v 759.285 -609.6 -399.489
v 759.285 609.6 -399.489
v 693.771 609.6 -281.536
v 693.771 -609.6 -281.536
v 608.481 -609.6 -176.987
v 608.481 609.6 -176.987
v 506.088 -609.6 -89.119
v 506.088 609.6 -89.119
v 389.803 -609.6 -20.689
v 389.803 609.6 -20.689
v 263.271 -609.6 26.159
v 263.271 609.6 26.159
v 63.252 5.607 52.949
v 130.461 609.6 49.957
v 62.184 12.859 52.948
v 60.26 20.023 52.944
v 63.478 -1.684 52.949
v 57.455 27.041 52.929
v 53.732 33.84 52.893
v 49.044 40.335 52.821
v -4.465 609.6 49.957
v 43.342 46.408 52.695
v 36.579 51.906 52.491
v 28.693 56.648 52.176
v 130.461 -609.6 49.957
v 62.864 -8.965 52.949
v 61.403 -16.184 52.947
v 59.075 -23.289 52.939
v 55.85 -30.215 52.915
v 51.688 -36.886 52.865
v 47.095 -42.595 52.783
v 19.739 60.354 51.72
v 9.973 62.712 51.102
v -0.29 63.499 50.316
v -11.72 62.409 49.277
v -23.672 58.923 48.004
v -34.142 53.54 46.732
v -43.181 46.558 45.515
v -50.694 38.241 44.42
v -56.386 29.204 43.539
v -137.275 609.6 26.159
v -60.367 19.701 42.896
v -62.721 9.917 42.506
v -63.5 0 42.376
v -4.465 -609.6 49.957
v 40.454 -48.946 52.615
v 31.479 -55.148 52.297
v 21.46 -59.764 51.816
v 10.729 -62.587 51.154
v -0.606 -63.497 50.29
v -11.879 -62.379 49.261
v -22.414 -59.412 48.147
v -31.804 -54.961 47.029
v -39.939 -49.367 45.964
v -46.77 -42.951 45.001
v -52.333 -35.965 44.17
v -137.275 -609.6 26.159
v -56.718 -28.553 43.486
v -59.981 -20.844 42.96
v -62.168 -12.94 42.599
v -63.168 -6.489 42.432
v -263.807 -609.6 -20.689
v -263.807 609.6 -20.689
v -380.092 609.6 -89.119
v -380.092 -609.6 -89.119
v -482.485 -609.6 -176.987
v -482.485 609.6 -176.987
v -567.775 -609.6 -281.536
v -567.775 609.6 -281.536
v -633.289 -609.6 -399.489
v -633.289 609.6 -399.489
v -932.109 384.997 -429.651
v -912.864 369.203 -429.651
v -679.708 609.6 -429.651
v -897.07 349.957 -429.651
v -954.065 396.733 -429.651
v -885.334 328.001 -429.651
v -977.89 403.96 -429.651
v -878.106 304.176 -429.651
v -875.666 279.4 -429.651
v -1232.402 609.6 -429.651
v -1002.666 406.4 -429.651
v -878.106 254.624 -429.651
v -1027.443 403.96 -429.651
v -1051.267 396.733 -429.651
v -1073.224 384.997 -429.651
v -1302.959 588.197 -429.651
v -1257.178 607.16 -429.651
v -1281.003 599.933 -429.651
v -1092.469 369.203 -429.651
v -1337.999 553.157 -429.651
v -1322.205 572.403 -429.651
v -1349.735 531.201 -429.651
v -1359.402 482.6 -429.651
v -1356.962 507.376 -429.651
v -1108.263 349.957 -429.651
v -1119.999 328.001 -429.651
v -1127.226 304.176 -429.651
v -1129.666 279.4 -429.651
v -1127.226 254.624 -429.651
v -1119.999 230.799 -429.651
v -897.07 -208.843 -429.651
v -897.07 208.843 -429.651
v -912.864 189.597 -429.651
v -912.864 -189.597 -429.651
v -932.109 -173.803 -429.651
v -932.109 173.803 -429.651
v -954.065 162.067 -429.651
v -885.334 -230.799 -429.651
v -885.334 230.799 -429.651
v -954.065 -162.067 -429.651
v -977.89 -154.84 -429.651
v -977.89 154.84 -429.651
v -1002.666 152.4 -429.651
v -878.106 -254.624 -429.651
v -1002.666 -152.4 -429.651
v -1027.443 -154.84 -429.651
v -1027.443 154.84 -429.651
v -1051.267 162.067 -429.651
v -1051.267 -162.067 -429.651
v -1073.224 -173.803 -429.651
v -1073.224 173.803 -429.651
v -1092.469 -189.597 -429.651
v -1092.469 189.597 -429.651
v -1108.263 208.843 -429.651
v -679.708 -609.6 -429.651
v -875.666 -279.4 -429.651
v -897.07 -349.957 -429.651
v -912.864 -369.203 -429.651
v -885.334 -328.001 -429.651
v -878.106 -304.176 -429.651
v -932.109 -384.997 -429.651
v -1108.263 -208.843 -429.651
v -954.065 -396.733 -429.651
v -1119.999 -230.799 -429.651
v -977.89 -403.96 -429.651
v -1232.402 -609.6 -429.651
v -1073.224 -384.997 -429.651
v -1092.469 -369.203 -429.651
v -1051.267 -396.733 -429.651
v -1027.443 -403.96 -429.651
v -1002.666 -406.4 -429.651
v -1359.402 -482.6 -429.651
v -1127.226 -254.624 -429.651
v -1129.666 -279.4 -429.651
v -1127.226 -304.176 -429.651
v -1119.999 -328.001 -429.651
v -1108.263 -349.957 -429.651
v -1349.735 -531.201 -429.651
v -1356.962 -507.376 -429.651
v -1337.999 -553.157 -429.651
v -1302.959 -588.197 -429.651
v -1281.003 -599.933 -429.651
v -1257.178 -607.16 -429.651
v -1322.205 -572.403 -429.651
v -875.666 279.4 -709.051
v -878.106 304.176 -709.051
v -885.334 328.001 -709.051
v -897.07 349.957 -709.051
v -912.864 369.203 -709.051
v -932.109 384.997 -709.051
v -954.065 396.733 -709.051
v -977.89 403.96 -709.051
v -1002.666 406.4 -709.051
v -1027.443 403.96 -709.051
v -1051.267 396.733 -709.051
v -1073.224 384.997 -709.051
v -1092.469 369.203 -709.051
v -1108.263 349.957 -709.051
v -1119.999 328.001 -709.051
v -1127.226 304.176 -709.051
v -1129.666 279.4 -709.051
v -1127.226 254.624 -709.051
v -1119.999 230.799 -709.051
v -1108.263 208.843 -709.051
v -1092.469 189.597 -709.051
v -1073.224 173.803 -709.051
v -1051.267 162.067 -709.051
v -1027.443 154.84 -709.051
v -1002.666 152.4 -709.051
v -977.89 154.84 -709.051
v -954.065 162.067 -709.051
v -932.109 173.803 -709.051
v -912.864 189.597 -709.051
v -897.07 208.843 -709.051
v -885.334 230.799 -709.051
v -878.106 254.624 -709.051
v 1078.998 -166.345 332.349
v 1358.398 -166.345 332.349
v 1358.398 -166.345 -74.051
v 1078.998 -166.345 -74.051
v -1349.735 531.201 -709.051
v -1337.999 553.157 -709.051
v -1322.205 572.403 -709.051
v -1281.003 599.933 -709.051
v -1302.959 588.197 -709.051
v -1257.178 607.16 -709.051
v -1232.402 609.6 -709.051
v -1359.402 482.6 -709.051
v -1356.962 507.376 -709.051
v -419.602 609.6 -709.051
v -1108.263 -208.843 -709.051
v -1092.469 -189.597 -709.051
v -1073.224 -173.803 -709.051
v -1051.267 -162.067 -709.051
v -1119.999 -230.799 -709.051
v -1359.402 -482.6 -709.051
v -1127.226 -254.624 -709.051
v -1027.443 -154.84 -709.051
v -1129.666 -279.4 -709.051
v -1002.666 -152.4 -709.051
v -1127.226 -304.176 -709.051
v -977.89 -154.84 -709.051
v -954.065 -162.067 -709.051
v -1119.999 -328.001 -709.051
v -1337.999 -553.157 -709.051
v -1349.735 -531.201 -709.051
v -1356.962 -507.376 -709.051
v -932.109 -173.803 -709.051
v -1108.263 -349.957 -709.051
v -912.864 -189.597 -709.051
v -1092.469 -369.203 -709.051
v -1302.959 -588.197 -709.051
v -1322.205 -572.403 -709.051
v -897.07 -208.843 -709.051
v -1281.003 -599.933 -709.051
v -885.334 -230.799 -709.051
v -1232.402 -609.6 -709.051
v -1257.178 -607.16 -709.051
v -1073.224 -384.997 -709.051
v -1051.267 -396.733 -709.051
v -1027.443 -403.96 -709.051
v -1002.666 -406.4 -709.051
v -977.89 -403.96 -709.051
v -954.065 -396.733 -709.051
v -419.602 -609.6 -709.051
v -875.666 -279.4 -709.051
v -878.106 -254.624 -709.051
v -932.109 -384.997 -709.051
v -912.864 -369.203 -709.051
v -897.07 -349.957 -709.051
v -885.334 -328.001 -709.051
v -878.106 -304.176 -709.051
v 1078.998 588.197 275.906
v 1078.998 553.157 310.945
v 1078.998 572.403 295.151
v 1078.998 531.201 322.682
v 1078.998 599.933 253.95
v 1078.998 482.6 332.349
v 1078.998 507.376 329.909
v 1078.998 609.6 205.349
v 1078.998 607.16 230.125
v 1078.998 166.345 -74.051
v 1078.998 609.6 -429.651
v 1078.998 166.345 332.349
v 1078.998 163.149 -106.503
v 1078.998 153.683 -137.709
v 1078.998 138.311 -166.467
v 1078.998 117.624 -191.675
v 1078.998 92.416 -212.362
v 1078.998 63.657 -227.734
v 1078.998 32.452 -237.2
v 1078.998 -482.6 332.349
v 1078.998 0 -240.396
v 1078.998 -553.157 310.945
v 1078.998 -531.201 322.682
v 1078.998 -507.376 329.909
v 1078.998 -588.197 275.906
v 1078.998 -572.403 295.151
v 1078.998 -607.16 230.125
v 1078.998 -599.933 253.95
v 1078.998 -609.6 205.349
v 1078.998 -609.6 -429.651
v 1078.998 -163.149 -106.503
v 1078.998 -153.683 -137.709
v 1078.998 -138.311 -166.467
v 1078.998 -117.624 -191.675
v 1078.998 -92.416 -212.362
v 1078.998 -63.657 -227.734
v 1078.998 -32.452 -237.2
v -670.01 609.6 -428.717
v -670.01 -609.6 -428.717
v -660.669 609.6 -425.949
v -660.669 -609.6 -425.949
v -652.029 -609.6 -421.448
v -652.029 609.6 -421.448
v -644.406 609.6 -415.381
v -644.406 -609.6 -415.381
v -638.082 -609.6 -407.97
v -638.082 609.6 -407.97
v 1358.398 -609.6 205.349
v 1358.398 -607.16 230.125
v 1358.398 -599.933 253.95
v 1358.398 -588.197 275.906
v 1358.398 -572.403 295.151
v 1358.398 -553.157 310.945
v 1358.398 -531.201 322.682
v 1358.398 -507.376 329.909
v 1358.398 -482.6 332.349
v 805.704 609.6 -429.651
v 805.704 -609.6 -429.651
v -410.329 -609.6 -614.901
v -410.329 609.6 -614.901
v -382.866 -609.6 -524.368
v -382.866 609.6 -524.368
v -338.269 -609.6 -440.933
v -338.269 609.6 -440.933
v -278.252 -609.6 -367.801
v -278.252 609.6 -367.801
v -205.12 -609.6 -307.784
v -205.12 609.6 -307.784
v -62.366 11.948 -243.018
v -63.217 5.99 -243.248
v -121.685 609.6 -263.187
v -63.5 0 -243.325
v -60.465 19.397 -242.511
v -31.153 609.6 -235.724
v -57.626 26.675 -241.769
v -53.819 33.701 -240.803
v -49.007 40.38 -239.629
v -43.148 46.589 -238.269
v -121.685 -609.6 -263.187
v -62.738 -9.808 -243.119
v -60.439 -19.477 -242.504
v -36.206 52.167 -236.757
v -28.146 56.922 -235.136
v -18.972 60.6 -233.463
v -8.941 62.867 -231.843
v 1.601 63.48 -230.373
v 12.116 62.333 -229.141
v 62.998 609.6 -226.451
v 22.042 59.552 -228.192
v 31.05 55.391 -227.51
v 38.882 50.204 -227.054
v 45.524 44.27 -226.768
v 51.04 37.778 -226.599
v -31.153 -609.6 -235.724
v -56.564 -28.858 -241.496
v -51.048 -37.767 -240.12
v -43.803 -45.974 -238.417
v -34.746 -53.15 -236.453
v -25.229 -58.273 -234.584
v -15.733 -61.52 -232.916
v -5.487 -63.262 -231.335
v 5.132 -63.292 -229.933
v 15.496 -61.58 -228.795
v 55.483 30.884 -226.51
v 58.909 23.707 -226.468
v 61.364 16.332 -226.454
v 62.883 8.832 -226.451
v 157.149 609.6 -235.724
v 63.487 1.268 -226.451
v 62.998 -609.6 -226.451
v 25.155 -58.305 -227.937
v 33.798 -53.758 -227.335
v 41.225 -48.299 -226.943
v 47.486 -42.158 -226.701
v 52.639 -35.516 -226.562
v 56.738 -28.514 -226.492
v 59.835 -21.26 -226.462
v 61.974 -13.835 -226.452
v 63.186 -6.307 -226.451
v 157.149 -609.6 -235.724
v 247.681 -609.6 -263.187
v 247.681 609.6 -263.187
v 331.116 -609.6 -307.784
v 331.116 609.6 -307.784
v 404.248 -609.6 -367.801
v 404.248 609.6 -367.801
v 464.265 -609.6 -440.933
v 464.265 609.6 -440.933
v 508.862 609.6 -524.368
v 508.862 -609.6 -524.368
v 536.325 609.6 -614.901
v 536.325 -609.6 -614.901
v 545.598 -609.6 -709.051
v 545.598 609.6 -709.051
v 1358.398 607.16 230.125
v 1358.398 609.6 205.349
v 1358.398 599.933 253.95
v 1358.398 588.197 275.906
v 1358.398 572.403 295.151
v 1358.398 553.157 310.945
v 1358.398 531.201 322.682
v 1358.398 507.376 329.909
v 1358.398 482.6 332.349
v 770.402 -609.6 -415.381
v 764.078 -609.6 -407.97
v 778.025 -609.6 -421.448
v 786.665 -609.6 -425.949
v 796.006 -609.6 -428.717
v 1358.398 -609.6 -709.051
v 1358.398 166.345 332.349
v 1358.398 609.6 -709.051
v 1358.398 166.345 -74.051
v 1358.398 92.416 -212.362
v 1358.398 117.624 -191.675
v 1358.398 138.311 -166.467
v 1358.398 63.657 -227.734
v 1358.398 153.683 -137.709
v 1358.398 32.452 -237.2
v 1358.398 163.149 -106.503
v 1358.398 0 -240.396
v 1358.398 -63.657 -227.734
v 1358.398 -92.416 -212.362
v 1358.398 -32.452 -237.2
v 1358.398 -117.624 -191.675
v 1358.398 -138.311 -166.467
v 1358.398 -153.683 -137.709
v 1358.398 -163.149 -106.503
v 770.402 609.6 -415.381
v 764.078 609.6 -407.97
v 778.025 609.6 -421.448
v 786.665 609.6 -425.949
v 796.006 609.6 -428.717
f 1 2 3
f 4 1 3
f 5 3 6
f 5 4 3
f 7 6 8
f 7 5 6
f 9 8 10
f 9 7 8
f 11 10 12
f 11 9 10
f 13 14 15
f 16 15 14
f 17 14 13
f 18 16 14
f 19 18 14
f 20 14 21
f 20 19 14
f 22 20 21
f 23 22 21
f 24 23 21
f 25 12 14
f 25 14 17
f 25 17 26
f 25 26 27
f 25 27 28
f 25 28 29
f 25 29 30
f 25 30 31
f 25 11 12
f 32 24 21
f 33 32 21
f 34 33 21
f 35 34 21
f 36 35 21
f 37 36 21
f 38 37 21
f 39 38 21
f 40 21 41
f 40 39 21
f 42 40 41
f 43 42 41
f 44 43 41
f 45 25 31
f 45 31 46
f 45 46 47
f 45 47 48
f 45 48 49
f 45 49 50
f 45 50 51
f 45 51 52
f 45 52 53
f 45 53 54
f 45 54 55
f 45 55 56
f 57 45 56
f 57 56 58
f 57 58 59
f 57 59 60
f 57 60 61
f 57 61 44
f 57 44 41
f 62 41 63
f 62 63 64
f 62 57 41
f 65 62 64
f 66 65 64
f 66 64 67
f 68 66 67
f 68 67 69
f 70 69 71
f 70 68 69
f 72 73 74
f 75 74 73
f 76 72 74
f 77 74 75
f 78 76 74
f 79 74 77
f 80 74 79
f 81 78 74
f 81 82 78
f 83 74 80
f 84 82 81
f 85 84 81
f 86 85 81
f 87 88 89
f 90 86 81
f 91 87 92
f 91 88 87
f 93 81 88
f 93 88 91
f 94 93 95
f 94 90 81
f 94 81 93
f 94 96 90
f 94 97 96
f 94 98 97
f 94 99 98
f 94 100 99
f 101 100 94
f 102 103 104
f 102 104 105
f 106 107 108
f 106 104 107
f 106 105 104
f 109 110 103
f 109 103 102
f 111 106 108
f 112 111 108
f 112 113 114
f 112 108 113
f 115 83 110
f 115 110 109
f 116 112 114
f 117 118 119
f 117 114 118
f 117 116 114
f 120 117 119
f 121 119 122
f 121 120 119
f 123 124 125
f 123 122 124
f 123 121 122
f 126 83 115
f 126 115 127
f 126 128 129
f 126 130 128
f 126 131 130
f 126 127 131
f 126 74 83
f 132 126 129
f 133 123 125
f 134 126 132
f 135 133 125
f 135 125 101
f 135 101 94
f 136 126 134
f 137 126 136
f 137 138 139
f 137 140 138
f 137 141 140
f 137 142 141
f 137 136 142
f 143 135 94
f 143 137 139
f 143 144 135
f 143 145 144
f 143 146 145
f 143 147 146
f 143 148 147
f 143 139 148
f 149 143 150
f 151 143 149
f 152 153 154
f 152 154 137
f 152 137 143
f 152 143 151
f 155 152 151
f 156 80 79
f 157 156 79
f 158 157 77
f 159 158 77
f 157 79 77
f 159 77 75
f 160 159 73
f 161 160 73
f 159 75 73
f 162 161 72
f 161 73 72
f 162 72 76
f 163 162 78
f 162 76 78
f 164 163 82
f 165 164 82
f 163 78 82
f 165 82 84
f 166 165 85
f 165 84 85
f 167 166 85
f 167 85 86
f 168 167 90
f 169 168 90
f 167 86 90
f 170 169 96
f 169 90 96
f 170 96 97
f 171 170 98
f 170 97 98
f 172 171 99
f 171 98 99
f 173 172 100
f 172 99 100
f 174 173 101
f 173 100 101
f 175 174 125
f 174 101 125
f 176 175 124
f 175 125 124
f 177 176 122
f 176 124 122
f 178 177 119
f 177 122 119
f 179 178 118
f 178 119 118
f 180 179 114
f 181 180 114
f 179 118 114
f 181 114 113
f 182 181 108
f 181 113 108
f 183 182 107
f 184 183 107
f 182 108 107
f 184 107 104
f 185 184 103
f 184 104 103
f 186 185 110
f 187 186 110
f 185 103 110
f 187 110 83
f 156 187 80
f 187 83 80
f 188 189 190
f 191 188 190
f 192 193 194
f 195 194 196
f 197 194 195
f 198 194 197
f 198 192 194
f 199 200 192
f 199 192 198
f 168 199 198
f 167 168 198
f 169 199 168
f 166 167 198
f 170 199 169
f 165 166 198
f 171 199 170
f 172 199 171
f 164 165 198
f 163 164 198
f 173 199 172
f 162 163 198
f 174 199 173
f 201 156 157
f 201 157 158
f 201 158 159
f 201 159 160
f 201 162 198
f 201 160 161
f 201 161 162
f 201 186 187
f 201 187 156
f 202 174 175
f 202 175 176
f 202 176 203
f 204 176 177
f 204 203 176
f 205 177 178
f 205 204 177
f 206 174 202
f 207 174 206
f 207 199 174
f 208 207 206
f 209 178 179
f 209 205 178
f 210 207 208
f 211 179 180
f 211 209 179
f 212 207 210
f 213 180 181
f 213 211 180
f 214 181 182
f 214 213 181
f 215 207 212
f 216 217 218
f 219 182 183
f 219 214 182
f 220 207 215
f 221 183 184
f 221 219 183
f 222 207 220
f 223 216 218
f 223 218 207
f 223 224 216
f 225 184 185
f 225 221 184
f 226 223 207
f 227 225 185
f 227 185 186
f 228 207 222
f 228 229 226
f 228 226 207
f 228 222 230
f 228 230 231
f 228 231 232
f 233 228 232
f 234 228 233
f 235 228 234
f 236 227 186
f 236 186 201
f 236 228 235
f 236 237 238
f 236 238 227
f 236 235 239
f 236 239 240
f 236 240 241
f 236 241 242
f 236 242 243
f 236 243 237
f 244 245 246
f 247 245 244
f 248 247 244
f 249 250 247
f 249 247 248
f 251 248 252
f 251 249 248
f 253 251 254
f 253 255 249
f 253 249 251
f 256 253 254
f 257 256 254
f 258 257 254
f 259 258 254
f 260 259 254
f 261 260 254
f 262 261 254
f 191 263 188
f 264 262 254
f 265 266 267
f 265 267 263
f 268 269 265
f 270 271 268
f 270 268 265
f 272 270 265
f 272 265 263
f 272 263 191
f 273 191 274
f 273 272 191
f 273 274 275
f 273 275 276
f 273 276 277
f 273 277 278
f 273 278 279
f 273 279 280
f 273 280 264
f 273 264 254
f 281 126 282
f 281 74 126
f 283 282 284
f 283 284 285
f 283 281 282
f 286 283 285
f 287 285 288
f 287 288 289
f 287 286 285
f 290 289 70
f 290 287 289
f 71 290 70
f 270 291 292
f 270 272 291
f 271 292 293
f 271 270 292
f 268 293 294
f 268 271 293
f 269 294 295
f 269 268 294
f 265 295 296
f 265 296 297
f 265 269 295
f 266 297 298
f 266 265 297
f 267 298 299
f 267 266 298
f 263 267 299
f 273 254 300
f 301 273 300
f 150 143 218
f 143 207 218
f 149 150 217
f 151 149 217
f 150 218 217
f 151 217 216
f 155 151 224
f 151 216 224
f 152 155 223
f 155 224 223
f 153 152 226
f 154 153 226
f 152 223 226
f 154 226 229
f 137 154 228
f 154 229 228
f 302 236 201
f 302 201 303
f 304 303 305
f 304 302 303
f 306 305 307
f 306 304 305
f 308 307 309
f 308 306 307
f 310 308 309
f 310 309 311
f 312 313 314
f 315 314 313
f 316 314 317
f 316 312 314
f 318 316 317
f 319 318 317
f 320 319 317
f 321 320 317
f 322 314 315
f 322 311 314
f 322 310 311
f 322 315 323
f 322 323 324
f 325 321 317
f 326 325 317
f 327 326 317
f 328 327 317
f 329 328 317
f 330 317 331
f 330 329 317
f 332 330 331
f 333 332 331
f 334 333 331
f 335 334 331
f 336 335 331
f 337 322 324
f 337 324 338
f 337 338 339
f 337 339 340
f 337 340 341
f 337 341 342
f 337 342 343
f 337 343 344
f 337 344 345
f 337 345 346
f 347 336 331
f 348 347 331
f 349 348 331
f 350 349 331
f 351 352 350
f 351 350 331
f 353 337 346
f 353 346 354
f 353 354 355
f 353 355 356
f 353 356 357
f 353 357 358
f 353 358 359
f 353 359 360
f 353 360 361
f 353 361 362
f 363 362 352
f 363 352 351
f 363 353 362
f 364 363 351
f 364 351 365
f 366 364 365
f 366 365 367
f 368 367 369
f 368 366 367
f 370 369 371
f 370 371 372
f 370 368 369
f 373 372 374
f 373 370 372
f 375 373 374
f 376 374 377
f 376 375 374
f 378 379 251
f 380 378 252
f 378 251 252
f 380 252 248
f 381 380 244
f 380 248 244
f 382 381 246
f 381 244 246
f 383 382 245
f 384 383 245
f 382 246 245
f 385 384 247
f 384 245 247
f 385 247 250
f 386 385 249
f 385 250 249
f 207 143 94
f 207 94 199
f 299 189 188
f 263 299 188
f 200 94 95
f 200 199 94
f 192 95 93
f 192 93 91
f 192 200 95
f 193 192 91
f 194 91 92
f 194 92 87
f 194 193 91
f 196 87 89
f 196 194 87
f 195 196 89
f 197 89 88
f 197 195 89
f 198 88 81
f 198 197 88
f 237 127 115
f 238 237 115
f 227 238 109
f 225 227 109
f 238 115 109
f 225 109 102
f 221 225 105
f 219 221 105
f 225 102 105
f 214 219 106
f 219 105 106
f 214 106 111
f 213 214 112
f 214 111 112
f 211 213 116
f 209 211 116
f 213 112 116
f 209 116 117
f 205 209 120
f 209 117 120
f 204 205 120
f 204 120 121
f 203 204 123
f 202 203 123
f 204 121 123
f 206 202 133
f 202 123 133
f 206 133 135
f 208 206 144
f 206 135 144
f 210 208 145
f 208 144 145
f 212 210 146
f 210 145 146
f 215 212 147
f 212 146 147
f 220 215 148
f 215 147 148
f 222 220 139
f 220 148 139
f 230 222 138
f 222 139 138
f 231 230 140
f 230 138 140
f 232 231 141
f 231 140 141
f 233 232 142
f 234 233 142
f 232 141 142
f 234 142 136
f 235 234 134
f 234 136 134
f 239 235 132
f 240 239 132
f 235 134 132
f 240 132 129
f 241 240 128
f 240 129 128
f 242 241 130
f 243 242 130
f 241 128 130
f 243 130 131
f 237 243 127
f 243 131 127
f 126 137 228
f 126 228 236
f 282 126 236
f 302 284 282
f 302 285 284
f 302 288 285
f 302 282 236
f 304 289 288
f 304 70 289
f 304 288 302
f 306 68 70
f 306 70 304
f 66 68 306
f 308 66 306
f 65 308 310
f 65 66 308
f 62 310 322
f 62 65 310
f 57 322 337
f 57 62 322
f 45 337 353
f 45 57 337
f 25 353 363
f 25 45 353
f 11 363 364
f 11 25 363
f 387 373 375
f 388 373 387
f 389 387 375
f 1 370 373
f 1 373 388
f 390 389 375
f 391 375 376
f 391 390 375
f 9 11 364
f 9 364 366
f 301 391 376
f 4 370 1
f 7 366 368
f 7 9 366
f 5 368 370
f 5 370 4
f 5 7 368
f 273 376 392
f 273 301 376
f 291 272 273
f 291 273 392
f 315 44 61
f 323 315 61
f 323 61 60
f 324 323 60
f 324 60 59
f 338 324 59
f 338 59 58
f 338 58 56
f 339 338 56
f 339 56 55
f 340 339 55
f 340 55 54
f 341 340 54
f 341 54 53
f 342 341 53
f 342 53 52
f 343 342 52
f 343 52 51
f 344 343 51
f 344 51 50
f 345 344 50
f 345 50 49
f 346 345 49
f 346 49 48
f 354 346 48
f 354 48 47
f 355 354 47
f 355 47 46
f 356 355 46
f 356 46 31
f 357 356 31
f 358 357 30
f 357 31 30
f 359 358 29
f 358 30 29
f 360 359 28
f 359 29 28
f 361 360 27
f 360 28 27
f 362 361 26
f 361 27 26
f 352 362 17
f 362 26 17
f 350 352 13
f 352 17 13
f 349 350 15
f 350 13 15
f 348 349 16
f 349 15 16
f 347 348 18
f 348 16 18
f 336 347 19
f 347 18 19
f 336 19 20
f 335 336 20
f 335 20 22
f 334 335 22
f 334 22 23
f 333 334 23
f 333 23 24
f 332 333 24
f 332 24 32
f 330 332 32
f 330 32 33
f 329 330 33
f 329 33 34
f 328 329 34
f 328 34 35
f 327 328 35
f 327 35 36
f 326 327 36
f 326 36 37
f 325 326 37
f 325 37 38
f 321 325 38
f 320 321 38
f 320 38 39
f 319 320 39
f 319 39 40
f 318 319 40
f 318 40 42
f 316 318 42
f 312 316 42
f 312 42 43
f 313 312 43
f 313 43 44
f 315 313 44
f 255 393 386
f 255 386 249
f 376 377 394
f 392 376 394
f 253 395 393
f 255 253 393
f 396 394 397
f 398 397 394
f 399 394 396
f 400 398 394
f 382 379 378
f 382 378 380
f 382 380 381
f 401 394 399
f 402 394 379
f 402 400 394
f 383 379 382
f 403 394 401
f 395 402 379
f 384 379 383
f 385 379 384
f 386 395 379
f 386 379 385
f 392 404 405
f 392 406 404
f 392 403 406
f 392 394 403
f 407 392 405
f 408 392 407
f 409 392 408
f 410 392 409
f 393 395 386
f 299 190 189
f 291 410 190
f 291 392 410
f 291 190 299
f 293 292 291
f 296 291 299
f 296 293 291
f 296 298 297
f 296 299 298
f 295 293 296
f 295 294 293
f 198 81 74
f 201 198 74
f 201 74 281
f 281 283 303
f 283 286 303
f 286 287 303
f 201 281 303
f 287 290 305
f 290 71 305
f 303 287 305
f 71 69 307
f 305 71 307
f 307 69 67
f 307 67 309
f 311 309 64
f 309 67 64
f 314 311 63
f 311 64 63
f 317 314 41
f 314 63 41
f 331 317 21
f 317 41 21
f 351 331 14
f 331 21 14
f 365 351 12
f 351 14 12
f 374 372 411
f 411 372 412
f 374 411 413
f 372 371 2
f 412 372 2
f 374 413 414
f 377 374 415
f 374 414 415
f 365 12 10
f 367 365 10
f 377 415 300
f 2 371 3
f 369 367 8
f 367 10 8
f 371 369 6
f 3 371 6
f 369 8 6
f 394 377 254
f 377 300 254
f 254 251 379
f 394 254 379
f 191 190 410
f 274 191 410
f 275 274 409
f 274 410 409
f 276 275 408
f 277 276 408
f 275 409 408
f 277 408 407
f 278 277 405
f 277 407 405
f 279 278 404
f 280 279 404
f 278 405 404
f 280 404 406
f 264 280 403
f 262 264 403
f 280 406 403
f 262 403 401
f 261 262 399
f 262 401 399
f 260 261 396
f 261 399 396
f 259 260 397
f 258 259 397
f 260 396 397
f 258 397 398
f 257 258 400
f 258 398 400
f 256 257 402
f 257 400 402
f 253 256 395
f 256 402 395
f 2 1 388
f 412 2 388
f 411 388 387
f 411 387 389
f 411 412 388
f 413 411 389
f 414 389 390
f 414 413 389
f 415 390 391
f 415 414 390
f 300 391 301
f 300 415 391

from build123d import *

# Parameters (mm, degrees)
F1_DEPTH = 609.6
F3_DEPTH = 279.4
F4_R     = 127
F5_R     = 127
F6_R     = 127
F7_DEPTH = 279.4
F8_DEPTH = 279.4
F9_D     = 127
F9_DEPTH = 279.4
F9_START = 203.2000001
F9_TIP   = 38.1546493083
F10_R    = 127
F11_R    = 50.8


with BuildPart() as f1:
    # F0 (on Front) → F1 (new body, symmetric)
    with BuildSketch(Plane.XZ):
        with BuildLine():
            Line((-1359.4019456148, -429.6511576342), (-1359.4019456148, -709.0511576342))
            Line((-1359.4019456148, -709.0511576342), (-419.6019456148, -709.0511576342))
            ThreePointArc((-419.6019456148, -709.0511576342), (62.9980543852, -226.4511576342), (545.5980543852, -709.0511576342))
            Line((545.5980543852, -709.0511576342), (1358.3980543852, -709.0511576342))
            Line((1358.3980543852, -709.0511576342), (1358.3980543852, 332.3488423657))
            Line((1358.3980543852, 332.3488423657), (1078.9980543852, 332.3488423657))
            Line((1078.9980543852, 332.3488423657), (1078.9980543852, -429.6511576342))
            Line((1078.9980543852, -429.6511576342), (771.9265698224, -429.6511576342))
            ThreePointArc((771.9265698224, -429.6511576342), (62.9980543852, 52.9488423658), (-645.930461052, -429.6511576342))
            Line((-645.930461052, -429.6511576342), (-1359.4019456148, -429.6511576342))
        make_face()
    extrude(amount=F1_DEPTH, both=True)

    # F2 (on face) → F3 (cut)
    with BuildSketch(Plane.YZ.offset(1358.3980543852)):
        with BuildLine():
            Line((166.3447904319, -74.0511576342), (166.3447904319, 332.3488423657))
            Line((166.3447904319, 332.3488423657), (-166.3447904319, 332.3488423657))
            Line((-166.3447904319, 332.3488423657), (-166.3447904319, -74.0511576342))
            ThreePointArc((-166.3447904319, -74.0511576342), (0, -240.3959480662), (166.3447904319, -74.0511576342))
        make_face()
    extrude(amount=-F3_DEPTH, mode=Mode.SUBTRACT)

    # F4
    f4_edges = [f1.edges().sort_by_distance(p)[0] for p in [
        (1218.698054, -609.6, 332.348842),
    ]]
    fillet(f4_edges, radius=F4_R)

    # F5
    f5_edges = [f1.edges().sort_by_distance(p)[0] for p in [
        (1218.698054, 609.6, 332.348842),
    ]]
    fillet(f5_edges, radius=F5_R)

    # F6 (on face) → F7 (cut)
    with BuildSketch(Plane.XY.offset(-429.6511576342)):
        with Locations((-1002.6662033334, -279.4)):
            Circle(F6_R)
    extrude(amount=-F7_DEPTH, mode=Mode.SUBTRACT)

    # F6 (on face) → F8 (cut)
    with BuildSketch(Plane.XY.offset(-429.6511576342)):
        with Locations((-1002.6662033334, 279.4)):
            Circle(F6_R)
    extrude(amount=-F8_DEPTH, mode=Mode.SUBTRACT)

    # F9
    # its depths count from where the whole tool has entered the part; down to there all is cleared
    with Locations(Plane(origin=(0, 0, -429.6511576342), x_dir=(1, 0, 0), z_dir=(0, 0, -1)).offset(-F9_START)):
        with Locations((0, 0)):
            Hole(F9_D / 2, depth=F9_DEPTH)
            with Locations((0, 0, -(F9_DEPTH + F9_TIP / 2))):  # 118° drill point
                Cone(0, F9_D / 2, F9_TIP, mode=Mode.SUBTRACT)

    # F10
    f10_edges = [f1.edges().sort_by_distance(p)[0] for p in [
        (-1359.401946, 609.6, -569.351158),
        (-1359.401946, -609.6, -569.351158),
    ]]
    fillet(f10_edges, radius=F10_R)

    # F11
    f11_edges = [f1.edges().sort_by_distance(p)[0] for p in [
        (-645.930461, 0, -429.651158),
        (771.92657, 0, -429.651158),
    ]]
    fillet(f11_edges, radius=F11_R)


solid = f1.part
